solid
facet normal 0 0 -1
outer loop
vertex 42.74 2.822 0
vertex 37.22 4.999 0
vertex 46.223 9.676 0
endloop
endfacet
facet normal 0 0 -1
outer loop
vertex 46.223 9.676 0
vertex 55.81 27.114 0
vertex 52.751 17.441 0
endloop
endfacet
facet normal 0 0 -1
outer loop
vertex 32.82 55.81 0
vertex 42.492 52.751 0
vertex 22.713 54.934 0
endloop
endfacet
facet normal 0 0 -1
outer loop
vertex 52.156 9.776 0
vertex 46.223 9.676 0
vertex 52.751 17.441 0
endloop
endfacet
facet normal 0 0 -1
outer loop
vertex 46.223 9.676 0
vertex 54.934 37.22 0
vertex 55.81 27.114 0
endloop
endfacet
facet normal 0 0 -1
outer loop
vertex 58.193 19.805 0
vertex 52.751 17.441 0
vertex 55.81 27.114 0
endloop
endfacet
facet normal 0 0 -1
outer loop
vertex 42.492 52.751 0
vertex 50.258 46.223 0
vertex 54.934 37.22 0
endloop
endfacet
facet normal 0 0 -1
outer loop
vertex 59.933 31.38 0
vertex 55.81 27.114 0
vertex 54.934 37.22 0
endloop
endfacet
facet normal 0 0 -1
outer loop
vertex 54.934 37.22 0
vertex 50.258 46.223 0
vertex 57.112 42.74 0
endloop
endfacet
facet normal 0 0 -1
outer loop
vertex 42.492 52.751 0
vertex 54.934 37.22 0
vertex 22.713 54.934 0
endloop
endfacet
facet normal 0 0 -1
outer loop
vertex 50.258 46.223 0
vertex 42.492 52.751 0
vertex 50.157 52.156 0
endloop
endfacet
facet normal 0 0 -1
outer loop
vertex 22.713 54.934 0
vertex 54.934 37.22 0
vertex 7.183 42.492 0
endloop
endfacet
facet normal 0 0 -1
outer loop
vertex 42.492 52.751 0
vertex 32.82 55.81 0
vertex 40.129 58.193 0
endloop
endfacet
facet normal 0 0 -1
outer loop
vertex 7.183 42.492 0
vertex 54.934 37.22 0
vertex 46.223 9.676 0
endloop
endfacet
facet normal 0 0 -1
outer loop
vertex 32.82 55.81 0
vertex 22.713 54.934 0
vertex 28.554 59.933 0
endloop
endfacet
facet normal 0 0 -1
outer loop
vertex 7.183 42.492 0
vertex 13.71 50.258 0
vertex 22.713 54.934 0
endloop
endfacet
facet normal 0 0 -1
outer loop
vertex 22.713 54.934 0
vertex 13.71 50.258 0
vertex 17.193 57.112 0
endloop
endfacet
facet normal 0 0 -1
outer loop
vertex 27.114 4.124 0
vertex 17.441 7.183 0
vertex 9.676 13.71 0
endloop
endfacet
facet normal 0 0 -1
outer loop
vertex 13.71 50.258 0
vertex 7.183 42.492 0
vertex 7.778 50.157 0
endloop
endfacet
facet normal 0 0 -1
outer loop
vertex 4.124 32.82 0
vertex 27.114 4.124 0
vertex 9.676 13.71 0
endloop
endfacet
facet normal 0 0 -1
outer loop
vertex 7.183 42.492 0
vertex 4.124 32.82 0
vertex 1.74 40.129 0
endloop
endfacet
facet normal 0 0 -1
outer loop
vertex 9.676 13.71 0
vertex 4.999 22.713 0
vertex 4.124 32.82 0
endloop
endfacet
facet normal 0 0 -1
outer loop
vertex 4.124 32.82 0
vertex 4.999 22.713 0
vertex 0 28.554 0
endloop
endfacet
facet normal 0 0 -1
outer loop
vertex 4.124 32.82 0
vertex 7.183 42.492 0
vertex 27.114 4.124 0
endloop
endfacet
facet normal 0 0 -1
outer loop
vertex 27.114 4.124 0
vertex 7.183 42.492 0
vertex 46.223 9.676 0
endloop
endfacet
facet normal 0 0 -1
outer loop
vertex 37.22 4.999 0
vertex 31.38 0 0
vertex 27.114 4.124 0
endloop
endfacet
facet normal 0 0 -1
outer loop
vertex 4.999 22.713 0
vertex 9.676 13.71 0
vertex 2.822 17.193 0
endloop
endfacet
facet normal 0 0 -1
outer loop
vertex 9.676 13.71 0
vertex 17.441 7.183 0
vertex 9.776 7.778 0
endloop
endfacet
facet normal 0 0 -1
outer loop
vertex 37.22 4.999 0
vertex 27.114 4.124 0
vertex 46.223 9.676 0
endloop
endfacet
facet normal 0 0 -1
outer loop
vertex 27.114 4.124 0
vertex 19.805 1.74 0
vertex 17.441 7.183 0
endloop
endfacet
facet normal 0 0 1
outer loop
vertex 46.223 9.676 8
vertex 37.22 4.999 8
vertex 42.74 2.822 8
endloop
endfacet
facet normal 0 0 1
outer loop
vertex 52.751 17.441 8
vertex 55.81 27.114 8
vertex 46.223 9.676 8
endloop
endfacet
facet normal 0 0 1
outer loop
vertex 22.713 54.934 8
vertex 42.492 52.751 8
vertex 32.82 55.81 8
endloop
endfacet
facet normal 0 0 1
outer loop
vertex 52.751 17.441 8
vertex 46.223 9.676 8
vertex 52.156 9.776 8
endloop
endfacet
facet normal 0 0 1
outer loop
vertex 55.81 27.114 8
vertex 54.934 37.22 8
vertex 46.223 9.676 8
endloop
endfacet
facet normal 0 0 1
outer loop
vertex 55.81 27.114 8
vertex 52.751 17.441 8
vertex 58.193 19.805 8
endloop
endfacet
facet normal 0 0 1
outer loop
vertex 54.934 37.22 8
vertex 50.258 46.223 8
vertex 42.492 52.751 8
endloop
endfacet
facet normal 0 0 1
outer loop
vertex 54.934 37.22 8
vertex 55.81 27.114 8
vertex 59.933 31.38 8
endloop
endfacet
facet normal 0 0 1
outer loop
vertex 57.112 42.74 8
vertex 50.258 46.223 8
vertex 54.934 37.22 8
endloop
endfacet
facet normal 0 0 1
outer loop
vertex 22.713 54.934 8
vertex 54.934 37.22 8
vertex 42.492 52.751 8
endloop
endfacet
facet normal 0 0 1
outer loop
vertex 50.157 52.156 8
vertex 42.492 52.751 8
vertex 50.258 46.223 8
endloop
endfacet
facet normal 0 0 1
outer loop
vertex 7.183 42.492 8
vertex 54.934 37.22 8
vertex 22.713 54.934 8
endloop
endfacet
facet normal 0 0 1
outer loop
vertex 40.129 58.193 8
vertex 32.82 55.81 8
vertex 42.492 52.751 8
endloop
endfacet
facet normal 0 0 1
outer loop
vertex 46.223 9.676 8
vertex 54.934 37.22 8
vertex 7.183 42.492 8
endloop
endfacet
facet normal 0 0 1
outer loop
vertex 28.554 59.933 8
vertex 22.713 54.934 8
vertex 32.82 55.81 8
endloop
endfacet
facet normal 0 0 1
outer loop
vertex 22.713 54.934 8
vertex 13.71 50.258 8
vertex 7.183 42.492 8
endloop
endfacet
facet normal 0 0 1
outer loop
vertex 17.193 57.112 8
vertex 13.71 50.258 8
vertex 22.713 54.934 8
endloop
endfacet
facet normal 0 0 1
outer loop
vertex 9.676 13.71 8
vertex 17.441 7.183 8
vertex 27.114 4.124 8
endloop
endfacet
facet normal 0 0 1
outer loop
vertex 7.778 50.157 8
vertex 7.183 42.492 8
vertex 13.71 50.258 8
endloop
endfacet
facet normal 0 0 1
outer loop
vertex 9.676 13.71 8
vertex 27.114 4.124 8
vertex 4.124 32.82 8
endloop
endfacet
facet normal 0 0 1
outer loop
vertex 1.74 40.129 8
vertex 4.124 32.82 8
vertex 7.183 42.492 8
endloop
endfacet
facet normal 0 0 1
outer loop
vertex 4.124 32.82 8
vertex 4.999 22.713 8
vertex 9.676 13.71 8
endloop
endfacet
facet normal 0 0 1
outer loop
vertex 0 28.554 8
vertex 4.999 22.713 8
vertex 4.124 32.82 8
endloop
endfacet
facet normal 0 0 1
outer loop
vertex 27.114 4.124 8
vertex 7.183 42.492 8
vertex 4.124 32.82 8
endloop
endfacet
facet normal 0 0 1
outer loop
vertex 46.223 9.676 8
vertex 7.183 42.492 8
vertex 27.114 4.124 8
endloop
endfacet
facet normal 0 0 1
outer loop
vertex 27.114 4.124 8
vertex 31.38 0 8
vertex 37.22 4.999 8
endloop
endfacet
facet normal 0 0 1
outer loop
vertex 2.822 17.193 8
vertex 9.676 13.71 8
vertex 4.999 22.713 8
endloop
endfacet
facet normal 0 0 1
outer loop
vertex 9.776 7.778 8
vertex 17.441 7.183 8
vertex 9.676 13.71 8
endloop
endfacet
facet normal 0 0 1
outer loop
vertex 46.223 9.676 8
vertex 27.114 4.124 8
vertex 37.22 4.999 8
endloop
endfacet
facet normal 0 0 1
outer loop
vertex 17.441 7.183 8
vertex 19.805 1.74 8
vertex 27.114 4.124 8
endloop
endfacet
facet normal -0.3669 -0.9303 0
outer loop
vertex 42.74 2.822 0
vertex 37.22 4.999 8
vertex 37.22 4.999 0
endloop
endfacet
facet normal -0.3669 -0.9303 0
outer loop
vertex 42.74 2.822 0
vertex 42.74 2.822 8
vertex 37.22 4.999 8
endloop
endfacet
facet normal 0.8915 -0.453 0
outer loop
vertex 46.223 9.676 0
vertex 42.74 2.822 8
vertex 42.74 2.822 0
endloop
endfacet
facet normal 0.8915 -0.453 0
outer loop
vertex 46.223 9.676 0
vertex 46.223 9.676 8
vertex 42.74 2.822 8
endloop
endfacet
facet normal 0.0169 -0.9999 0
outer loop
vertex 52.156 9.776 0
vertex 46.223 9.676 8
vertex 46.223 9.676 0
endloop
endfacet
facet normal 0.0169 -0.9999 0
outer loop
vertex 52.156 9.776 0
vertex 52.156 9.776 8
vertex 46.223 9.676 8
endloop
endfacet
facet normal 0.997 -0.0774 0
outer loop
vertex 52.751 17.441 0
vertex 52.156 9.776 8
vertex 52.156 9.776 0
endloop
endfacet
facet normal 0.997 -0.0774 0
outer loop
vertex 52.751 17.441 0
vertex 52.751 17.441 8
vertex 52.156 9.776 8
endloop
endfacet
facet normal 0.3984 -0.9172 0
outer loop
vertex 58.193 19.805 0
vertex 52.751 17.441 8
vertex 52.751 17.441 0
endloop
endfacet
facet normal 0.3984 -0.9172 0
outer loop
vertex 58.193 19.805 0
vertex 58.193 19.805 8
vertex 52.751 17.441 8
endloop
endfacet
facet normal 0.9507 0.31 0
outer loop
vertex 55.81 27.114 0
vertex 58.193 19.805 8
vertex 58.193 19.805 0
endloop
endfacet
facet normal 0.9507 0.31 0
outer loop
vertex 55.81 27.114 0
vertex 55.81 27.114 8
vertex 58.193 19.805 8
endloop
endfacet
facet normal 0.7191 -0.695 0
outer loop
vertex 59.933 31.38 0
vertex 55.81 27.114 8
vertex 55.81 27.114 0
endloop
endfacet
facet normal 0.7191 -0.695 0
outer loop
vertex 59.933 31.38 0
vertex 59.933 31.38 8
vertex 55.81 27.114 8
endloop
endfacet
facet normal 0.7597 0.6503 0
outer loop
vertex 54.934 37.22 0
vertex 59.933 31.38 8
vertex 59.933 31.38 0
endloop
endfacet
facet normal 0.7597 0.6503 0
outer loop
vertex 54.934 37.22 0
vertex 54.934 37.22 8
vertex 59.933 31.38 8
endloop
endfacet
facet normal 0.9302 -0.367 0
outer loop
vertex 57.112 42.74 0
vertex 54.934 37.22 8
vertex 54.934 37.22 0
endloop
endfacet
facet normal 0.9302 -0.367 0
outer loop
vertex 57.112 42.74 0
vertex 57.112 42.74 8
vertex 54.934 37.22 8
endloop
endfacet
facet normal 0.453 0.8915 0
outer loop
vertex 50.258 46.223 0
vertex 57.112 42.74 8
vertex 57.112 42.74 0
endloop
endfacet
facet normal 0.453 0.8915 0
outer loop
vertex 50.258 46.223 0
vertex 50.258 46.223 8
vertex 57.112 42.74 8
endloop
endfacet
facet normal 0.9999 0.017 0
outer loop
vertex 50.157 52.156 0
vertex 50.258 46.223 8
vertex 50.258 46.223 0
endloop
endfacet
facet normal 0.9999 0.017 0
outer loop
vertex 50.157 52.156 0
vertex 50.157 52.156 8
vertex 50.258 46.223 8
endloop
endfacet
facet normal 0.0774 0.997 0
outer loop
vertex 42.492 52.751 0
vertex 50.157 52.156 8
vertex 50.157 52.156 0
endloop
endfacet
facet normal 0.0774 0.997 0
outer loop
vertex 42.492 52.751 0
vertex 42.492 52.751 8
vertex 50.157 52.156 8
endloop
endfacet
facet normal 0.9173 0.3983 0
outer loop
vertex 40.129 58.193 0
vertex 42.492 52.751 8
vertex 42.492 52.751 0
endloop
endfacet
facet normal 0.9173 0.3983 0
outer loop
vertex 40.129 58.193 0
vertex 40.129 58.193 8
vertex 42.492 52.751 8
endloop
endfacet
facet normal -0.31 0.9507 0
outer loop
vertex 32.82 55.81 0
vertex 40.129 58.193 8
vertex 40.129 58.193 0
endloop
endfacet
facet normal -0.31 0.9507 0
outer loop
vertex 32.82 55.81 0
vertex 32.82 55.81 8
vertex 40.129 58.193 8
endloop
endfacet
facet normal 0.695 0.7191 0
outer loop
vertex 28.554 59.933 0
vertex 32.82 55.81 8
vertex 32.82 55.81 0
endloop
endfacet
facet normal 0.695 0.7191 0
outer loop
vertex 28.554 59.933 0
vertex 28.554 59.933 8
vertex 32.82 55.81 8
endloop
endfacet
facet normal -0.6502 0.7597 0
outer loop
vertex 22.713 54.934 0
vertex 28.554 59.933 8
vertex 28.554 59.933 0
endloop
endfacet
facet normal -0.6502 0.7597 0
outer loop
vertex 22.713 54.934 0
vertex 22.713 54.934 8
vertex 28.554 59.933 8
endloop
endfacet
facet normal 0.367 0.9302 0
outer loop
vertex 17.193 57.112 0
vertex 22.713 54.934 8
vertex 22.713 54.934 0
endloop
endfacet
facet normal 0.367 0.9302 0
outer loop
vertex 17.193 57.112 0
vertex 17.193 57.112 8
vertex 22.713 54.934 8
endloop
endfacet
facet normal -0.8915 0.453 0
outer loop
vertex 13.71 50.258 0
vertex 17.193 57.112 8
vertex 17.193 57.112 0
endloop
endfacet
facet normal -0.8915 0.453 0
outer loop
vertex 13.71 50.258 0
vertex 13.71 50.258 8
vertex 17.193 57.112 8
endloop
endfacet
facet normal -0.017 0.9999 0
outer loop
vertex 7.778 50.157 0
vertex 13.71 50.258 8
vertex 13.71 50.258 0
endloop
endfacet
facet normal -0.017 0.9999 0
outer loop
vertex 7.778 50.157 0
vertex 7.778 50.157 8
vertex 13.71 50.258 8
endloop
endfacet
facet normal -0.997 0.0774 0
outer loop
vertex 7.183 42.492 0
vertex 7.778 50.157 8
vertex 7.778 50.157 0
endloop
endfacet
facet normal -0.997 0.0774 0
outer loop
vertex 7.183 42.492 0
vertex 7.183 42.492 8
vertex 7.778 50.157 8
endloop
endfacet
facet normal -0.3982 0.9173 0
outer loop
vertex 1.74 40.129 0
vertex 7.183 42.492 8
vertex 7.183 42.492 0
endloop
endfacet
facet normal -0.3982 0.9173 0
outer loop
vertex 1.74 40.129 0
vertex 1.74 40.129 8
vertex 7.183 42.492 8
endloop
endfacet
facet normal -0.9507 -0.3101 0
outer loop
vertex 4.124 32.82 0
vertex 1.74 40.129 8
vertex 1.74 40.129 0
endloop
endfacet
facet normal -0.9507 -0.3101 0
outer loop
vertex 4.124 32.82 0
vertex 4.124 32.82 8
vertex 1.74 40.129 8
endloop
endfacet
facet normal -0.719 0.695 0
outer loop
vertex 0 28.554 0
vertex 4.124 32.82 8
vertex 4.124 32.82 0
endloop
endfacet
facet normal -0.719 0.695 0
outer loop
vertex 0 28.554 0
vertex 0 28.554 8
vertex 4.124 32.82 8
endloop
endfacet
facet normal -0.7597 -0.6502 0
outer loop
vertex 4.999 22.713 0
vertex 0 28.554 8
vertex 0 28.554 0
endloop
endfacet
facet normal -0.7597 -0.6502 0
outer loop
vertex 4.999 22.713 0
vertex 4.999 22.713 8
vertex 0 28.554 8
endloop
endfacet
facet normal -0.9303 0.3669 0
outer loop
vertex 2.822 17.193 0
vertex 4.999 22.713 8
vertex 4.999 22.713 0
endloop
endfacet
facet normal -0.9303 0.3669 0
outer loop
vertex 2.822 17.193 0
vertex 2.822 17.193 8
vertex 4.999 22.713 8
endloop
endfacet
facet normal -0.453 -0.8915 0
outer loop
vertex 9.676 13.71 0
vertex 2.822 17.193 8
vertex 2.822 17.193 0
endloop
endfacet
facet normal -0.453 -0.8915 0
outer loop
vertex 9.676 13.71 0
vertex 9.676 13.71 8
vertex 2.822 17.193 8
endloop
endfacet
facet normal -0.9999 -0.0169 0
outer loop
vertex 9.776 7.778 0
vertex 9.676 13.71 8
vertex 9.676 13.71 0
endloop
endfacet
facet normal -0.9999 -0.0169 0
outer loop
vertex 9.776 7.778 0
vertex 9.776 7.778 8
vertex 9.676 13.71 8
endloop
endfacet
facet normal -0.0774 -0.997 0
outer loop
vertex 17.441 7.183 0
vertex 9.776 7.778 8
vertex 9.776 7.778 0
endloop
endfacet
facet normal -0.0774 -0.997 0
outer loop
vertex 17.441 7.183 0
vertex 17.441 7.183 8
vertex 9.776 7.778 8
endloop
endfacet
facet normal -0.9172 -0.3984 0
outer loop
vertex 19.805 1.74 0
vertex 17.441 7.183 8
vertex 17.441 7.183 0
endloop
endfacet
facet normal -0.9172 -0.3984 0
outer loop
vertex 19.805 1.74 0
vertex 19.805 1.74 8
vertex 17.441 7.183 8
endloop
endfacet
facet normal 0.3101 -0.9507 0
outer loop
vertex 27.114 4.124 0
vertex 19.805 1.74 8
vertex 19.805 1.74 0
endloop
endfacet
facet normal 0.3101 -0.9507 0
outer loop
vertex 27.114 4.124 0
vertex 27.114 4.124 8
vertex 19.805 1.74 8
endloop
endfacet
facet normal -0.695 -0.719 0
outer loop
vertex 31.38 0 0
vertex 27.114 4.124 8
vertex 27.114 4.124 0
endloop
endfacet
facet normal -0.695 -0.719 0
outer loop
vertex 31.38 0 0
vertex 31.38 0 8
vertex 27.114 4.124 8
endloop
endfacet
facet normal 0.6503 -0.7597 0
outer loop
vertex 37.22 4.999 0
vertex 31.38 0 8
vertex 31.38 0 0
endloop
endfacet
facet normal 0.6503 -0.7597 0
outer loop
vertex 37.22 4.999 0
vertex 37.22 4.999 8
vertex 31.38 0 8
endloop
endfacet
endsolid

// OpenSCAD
$fn = 32;

// ----------------------------------------------------------------------
// Chain sprocket: 16 teeth, 26 mm root radius
// ----------------------------------------------------------------------

// --- parameters (mm) ---
profile_height = 8;       // extrusion height
profile_points = 32;      // points of the closed outline

profile = [[55.81, 27.114], [59.933, 31.38], [54.934, 37.22], [57.112, 42.74], [50.258, 46.223], [50.157, 52.156], [42.492, 52.751], [40.129, 58.193], [32.82, 55.81], [28.554, 59.933], [22.713, 54.934], [17.193, 57.112], [13.71, 50.258], [7.778, 50.157], [7.183, 42.492], [1.74, 40.129], [4.124, 32.82], [0, 28.554], [4.999, 22.713], [2.822, 17.193], [9.676, 13.71], [9.776, 7.778], [17.441, 7.183], [19.805, 1.74], [27.114, 4.124], [31.38, 0], [37.22, 4.999], [42.74, 2.822], [46.223, 9.676], [52.156, 9.776], [52.751, 17.441], [58.193, 19.805]];  // single closed polygon, 32 points, counter clockwise

// --- the one profile operation ---
linear_extrude(height = profile_height) polygon(points = profile);
